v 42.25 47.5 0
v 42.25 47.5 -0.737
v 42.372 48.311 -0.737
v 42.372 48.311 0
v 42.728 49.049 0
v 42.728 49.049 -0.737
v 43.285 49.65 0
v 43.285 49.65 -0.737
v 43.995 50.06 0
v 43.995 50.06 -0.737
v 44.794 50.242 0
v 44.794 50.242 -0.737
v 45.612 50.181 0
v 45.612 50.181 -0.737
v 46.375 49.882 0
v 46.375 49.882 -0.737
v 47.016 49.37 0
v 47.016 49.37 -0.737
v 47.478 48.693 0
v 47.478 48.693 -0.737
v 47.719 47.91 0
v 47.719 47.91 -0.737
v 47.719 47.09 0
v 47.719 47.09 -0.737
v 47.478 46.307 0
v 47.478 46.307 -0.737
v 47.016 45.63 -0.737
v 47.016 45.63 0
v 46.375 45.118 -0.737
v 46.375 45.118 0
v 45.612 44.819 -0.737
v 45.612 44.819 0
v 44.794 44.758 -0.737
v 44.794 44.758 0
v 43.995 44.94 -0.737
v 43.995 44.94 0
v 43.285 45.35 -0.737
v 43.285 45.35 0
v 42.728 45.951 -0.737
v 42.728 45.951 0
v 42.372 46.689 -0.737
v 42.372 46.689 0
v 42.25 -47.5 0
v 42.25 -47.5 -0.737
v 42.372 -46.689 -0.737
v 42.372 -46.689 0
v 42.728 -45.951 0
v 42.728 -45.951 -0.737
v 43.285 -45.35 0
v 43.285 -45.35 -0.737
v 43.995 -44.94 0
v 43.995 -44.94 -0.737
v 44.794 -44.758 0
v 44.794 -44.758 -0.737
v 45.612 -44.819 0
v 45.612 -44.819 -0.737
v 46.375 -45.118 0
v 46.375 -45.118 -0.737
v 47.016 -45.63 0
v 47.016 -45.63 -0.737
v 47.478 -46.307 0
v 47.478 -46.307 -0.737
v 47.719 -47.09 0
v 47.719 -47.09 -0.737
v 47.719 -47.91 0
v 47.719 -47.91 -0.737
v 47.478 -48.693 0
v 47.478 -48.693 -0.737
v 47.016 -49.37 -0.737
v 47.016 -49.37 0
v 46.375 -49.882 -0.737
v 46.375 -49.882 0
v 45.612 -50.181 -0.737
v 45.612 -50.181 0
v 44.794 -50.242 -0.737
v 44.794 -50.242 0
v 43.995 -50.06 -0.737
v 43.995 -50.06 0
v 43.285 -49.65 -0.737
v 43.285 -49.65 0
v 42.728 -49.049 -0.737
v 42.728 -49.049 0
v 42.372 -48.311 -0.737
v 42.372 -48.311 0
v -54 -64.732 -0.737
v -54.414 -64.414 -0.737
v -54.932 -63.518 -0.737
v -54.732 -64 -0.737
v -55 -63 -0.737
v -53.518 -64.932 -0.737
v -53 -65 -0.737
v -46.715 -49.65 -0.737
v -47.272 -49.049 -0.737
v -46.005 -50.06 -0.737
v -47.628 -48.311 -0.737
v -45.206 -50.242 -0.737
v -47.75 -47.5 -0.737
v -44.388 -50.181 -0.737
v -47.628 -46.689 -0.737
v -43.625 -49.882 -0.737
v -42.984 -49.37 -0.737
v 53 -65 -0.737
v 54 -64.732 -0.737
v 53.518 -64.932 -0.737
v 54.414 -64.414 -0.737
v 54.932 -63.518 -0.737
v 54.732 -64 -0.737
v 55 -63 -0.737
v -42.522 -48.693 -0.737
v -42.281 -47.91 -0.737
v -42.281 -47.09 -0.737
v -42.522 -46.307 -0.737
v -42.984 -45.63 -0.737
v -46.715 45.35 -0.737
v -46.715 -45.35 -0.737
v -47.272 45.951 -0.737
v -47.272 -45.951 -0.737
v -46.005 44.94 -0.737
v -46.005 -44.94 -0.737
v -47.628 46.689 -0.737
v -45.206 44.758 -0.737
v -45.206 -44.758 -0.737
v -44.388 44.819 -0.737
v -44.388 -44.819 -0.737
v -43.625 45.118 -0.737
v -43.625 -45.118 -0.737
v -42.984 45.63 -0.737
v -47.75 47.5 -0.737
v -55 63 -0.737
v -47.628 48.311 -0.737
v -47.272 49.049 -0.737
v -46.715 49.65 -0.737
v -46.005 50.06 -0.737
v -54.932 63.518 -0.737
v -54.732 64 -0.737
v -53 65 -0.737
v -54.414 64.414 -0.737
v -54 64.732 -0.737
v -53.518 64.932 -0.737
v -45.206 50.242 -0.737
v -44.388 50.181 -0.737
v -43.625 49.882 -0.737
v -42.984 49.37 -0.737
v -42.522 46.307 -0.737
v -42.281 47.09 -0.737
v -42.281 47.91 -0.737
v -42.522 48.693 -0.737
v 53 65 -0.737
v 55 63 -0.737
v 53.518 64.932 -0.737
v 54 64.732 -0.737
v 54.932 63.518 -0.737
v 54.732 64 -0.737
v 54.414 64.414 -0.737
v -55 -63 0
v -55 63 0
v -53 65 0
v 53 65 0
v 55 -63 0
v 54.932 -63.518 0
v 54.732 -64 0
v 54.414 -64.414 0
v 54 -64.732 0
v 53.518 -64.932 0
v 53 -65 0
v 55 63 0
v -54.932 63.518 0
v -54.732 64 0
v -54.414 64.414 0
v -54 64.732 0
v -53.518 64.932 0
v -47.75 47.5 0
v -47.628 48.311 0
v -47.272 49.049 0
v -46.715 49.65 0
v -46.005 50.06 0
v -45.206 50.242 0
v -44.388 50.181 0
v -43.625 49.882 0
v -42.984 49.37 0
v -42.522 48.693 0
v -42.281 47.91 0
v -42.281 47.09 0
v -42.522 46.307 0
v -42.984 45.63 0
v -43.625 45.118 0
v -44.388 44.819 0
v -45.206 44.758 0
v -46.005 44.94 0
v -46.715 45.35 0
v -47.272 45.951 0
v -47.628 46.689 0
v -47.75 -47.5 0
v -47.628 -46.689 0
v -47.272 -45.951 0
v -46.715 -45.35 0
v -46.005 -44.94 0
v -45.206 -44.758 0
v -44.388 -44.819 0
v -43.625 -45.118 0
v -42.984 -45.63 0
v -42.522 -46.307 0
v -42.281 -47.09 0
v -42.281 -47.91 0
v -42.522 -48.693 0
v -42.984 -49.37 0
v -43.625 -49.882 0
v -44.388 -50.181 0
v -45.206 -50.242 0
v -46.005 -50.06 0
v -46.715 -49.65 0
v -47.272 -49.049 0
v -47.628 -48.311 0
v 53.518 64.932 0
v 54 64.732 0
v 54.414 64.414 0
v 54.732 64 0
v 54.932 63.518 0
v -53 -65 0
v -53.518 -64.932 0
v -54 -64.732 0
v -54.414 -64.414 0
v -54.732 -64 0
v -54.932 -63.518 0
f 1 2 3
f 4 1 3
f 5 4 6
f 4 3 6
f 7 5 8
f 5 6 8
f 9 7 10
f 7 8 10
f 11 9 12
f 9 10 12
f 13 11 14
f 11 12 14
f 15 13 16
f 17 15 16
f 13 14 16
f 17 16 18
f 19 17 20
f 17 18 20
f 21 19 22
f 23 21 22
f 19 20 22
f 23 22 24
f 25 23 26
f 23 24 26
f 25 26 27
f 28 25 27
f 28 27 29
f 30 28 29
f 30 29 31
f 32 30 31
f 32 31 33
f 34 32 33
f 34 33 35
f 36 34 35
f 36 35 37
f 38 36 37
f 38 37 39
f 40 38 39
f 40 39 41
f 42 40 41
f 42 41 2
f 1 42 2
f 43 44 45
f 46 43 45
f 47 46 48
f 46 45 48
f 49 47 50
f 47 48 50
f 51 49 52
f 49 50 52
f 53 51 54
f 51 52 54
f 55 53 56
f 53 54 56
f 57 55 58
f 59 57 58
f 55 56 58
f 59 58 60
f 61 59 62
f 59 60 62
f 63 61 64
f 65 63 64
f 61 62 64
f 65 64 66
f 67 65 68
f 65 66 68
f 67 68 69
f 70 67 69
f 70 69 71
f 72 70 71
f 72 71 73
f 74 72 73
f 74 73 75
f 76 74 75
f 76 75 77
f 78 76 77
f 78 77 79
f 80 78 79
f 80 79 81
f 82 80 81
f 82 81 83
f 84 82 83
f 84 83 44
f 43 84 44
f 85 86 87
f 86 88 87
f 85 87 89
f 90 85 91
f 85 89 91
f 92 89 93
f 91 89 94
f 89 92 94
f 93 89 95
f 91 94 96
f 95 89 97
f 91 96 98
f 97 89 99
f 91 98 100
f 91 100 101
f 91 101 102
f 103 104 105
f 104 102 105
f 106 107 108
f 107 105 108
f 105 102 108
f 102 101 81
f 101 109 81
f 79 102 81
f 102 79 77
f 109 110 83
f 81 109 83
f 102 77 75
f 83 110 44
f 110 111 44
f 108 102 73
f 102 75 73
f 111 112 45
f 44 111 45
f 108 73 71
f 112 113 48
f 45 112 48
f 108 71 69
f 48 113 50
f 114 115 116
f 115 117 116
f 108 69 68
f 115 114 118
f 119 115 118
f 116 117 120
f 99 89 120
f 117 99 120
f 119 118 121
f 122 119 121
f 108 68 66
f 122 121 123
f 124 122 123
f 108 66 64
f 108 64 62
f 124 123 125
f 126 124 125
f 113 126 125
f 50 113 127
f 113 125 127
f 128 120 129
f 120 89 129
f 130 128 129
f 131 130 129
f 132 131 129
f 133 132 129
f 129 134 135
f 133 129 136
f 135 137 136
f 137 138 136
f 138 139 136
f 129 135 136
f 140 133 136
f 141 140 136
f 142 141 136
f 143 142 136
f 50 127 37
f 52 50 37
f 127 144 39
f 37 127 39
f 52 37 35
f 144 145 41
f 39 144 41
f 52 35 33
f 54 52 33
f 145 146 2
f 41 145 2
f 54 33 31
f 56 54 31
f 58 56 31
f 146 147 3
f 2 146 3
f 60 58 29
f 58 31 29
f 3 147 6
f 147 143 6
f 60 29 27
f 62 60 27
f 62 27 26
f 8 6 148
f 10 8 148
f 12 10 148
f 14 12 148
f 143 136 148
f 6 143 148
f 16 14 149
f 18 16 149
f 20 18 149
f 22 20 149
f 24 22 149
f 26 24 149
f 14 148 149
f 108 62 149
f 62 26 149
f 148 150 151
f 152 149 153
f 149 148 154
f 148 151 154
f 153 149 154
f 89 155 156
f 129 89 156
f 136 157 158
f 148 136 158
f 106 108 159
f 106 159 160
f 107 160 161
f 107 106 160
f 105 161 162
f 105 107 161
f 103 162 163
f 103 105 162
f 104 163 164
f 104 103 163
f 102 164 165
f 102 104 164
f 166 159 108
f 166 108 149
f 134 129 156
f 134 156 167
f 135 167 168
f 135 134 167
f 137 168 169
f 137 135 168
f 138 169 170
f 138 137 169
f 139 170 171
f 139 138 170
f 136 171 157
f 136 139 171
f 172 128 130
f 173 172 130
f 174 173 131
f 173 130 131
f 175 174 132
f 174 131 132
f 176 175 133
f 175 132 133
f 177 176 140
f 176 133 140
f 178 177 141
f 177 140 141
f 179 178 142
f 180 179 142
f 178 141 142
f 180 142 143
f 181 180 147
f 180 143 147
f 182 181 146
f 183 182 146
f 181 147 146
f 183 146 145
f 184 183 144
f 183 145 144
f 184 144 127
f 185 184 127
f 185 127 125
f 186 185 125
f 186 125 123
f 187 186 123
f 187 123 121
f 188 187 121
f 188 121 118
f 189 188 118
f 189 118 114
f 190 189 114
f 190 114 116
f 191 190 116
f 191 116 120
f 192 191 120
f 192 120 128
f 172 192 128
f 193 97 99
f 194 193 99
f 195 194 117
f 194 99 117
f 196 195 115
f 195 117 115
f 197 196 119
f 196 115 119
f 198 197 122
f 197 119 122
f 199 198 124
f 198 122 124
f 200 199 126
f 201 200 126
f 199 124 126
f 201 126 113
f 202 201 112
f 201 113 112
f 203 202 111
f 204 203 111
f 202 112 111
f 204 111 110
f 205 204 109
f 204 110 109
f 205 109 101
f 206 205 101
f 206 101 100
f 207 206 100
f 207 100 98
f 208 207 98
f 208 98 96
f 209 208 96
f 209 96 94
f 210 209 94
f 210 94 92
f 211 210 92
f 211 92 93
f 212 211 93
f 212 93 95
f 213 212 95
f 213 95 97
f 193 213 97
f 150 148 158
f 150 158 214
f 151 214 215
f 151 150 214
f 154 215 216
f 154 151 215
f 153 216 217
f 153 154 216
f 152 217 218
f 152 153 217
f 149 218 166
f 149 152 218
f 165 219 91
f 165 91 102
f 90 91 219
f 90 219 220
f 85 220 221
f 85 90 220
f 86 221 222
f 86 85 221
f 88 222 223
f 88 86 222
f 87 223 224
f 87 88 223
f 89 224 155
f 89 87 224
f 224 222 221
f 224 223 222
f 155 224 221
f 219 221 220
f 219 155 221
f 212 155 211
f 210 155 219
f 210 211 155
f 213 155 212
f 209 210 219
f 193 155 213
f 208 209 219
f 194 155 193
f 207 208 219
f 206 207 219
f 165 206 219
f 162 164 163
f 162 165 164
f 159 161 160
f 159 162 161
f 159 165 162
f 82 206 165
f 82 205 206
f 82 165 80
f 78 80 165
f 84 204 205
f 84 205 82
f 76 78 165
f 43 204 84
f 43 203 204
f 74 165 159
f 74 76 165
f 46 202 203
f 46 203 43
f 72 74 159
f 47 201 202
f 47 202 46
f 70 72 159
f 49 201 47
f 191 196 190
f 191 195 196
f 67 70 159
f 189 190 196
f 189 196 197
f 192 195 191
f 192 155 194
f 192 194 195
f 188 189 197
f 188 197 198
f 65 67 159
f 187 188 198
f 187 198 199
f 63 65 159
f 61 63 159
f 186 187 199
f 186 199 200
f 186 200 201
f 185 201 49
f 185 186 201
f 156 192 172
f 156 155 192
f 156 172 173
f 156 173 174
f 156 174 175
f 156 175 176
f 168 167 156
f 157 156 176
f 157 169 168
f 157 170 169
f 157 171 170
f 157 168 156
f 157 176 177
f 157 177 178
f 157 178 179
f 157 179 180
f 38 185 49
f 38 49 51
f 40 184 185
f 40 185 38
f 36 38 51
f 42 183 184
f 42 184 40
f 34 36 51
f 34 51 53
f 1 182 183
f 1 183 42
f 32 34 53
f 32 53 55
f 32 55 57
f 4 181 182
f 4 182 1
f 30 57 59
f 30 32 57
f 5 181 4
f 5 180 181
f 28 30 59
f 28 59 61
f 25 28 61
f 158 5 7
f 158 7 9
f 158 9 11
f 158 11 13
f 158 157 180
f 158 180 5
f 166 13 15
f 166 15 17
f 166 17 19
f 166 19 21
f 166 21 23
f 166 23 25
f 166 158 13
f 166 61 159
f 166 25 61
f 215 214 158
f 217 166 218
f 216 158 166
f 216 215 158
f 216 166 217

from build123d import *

# Parameters (mm, degrees)
ESQUISSE1_W               = 110
ESQUISSE1_H               = 130
T_LE_DE_BASE_PLI_E1_DEPTH = 0.7366
D_GAGEMENT_M51_D          = 5.5
COIN_BRIS_1_START         = -0.7366
COIN_BRIS_1_DEPTH         = 0.7366


# Read off the part's stored shape, not the designer's step: Coin-brisé1
# Sheet-metal steps are written as plain solids
with BuildPart() as part:
    # Esquisse1 → Tôle de base pliée1 (new body)
    with BuildSketch(Plane.XY):
        Rectangle(ESQUISSE1_W, ESQUISSE1_H)
    extrude(amount=-T_LE_DE_BASE_PLI_E1_DEPTH)

    # Dégagement M51 (through all)
    with Locations(Plane.XY):
        with Locations((-45, 47.5), (45, 47.5), (45, -47.5), (-45, -47.5)):
            Hole(D_GAGEMENT_M51_D / 2)

    # Coin-brisé1 outline → Coin-brisé1 (cut)
    with BuildSketch(Plane.XY.offset(COIN_BRIS_1_START)):
        with BuildLine():
            ThreePointArc((55, -63), (54.414213562, -64.414213562), (53, -65))
            Line((53, -65), (55, -65))
            Line((55, -65), (55, -63))
        make_face()
        with BuildLine():
            Line((-55, -65), (-53, -65))
            ThreePointArc((-53, -65), (-54.414213562, -64.414213562), (-55, -63))
            Line((-55, -63), (-55, -65))
        make_face()
        with BuildLine():
            ThreePointArc((53, 65), (54.414213562, 64.414213562), (55, 63))
            Line((55, 63), (55, 65))
            Line((55, 65), (53, 65))
        make_face()
        with BuildLine():
            Line((-55, 65), (-55, 63))
            ThreePointArc((-55, 63), (-54.414213562, 64.414213562), (-53, 65))
            Line((-53, 65), (-55, 65))
        make_face()
    extrude(amount=COIN_BRIS_1_DEPTH, mode=Mode.SUBTRACT)


solid = part.part
